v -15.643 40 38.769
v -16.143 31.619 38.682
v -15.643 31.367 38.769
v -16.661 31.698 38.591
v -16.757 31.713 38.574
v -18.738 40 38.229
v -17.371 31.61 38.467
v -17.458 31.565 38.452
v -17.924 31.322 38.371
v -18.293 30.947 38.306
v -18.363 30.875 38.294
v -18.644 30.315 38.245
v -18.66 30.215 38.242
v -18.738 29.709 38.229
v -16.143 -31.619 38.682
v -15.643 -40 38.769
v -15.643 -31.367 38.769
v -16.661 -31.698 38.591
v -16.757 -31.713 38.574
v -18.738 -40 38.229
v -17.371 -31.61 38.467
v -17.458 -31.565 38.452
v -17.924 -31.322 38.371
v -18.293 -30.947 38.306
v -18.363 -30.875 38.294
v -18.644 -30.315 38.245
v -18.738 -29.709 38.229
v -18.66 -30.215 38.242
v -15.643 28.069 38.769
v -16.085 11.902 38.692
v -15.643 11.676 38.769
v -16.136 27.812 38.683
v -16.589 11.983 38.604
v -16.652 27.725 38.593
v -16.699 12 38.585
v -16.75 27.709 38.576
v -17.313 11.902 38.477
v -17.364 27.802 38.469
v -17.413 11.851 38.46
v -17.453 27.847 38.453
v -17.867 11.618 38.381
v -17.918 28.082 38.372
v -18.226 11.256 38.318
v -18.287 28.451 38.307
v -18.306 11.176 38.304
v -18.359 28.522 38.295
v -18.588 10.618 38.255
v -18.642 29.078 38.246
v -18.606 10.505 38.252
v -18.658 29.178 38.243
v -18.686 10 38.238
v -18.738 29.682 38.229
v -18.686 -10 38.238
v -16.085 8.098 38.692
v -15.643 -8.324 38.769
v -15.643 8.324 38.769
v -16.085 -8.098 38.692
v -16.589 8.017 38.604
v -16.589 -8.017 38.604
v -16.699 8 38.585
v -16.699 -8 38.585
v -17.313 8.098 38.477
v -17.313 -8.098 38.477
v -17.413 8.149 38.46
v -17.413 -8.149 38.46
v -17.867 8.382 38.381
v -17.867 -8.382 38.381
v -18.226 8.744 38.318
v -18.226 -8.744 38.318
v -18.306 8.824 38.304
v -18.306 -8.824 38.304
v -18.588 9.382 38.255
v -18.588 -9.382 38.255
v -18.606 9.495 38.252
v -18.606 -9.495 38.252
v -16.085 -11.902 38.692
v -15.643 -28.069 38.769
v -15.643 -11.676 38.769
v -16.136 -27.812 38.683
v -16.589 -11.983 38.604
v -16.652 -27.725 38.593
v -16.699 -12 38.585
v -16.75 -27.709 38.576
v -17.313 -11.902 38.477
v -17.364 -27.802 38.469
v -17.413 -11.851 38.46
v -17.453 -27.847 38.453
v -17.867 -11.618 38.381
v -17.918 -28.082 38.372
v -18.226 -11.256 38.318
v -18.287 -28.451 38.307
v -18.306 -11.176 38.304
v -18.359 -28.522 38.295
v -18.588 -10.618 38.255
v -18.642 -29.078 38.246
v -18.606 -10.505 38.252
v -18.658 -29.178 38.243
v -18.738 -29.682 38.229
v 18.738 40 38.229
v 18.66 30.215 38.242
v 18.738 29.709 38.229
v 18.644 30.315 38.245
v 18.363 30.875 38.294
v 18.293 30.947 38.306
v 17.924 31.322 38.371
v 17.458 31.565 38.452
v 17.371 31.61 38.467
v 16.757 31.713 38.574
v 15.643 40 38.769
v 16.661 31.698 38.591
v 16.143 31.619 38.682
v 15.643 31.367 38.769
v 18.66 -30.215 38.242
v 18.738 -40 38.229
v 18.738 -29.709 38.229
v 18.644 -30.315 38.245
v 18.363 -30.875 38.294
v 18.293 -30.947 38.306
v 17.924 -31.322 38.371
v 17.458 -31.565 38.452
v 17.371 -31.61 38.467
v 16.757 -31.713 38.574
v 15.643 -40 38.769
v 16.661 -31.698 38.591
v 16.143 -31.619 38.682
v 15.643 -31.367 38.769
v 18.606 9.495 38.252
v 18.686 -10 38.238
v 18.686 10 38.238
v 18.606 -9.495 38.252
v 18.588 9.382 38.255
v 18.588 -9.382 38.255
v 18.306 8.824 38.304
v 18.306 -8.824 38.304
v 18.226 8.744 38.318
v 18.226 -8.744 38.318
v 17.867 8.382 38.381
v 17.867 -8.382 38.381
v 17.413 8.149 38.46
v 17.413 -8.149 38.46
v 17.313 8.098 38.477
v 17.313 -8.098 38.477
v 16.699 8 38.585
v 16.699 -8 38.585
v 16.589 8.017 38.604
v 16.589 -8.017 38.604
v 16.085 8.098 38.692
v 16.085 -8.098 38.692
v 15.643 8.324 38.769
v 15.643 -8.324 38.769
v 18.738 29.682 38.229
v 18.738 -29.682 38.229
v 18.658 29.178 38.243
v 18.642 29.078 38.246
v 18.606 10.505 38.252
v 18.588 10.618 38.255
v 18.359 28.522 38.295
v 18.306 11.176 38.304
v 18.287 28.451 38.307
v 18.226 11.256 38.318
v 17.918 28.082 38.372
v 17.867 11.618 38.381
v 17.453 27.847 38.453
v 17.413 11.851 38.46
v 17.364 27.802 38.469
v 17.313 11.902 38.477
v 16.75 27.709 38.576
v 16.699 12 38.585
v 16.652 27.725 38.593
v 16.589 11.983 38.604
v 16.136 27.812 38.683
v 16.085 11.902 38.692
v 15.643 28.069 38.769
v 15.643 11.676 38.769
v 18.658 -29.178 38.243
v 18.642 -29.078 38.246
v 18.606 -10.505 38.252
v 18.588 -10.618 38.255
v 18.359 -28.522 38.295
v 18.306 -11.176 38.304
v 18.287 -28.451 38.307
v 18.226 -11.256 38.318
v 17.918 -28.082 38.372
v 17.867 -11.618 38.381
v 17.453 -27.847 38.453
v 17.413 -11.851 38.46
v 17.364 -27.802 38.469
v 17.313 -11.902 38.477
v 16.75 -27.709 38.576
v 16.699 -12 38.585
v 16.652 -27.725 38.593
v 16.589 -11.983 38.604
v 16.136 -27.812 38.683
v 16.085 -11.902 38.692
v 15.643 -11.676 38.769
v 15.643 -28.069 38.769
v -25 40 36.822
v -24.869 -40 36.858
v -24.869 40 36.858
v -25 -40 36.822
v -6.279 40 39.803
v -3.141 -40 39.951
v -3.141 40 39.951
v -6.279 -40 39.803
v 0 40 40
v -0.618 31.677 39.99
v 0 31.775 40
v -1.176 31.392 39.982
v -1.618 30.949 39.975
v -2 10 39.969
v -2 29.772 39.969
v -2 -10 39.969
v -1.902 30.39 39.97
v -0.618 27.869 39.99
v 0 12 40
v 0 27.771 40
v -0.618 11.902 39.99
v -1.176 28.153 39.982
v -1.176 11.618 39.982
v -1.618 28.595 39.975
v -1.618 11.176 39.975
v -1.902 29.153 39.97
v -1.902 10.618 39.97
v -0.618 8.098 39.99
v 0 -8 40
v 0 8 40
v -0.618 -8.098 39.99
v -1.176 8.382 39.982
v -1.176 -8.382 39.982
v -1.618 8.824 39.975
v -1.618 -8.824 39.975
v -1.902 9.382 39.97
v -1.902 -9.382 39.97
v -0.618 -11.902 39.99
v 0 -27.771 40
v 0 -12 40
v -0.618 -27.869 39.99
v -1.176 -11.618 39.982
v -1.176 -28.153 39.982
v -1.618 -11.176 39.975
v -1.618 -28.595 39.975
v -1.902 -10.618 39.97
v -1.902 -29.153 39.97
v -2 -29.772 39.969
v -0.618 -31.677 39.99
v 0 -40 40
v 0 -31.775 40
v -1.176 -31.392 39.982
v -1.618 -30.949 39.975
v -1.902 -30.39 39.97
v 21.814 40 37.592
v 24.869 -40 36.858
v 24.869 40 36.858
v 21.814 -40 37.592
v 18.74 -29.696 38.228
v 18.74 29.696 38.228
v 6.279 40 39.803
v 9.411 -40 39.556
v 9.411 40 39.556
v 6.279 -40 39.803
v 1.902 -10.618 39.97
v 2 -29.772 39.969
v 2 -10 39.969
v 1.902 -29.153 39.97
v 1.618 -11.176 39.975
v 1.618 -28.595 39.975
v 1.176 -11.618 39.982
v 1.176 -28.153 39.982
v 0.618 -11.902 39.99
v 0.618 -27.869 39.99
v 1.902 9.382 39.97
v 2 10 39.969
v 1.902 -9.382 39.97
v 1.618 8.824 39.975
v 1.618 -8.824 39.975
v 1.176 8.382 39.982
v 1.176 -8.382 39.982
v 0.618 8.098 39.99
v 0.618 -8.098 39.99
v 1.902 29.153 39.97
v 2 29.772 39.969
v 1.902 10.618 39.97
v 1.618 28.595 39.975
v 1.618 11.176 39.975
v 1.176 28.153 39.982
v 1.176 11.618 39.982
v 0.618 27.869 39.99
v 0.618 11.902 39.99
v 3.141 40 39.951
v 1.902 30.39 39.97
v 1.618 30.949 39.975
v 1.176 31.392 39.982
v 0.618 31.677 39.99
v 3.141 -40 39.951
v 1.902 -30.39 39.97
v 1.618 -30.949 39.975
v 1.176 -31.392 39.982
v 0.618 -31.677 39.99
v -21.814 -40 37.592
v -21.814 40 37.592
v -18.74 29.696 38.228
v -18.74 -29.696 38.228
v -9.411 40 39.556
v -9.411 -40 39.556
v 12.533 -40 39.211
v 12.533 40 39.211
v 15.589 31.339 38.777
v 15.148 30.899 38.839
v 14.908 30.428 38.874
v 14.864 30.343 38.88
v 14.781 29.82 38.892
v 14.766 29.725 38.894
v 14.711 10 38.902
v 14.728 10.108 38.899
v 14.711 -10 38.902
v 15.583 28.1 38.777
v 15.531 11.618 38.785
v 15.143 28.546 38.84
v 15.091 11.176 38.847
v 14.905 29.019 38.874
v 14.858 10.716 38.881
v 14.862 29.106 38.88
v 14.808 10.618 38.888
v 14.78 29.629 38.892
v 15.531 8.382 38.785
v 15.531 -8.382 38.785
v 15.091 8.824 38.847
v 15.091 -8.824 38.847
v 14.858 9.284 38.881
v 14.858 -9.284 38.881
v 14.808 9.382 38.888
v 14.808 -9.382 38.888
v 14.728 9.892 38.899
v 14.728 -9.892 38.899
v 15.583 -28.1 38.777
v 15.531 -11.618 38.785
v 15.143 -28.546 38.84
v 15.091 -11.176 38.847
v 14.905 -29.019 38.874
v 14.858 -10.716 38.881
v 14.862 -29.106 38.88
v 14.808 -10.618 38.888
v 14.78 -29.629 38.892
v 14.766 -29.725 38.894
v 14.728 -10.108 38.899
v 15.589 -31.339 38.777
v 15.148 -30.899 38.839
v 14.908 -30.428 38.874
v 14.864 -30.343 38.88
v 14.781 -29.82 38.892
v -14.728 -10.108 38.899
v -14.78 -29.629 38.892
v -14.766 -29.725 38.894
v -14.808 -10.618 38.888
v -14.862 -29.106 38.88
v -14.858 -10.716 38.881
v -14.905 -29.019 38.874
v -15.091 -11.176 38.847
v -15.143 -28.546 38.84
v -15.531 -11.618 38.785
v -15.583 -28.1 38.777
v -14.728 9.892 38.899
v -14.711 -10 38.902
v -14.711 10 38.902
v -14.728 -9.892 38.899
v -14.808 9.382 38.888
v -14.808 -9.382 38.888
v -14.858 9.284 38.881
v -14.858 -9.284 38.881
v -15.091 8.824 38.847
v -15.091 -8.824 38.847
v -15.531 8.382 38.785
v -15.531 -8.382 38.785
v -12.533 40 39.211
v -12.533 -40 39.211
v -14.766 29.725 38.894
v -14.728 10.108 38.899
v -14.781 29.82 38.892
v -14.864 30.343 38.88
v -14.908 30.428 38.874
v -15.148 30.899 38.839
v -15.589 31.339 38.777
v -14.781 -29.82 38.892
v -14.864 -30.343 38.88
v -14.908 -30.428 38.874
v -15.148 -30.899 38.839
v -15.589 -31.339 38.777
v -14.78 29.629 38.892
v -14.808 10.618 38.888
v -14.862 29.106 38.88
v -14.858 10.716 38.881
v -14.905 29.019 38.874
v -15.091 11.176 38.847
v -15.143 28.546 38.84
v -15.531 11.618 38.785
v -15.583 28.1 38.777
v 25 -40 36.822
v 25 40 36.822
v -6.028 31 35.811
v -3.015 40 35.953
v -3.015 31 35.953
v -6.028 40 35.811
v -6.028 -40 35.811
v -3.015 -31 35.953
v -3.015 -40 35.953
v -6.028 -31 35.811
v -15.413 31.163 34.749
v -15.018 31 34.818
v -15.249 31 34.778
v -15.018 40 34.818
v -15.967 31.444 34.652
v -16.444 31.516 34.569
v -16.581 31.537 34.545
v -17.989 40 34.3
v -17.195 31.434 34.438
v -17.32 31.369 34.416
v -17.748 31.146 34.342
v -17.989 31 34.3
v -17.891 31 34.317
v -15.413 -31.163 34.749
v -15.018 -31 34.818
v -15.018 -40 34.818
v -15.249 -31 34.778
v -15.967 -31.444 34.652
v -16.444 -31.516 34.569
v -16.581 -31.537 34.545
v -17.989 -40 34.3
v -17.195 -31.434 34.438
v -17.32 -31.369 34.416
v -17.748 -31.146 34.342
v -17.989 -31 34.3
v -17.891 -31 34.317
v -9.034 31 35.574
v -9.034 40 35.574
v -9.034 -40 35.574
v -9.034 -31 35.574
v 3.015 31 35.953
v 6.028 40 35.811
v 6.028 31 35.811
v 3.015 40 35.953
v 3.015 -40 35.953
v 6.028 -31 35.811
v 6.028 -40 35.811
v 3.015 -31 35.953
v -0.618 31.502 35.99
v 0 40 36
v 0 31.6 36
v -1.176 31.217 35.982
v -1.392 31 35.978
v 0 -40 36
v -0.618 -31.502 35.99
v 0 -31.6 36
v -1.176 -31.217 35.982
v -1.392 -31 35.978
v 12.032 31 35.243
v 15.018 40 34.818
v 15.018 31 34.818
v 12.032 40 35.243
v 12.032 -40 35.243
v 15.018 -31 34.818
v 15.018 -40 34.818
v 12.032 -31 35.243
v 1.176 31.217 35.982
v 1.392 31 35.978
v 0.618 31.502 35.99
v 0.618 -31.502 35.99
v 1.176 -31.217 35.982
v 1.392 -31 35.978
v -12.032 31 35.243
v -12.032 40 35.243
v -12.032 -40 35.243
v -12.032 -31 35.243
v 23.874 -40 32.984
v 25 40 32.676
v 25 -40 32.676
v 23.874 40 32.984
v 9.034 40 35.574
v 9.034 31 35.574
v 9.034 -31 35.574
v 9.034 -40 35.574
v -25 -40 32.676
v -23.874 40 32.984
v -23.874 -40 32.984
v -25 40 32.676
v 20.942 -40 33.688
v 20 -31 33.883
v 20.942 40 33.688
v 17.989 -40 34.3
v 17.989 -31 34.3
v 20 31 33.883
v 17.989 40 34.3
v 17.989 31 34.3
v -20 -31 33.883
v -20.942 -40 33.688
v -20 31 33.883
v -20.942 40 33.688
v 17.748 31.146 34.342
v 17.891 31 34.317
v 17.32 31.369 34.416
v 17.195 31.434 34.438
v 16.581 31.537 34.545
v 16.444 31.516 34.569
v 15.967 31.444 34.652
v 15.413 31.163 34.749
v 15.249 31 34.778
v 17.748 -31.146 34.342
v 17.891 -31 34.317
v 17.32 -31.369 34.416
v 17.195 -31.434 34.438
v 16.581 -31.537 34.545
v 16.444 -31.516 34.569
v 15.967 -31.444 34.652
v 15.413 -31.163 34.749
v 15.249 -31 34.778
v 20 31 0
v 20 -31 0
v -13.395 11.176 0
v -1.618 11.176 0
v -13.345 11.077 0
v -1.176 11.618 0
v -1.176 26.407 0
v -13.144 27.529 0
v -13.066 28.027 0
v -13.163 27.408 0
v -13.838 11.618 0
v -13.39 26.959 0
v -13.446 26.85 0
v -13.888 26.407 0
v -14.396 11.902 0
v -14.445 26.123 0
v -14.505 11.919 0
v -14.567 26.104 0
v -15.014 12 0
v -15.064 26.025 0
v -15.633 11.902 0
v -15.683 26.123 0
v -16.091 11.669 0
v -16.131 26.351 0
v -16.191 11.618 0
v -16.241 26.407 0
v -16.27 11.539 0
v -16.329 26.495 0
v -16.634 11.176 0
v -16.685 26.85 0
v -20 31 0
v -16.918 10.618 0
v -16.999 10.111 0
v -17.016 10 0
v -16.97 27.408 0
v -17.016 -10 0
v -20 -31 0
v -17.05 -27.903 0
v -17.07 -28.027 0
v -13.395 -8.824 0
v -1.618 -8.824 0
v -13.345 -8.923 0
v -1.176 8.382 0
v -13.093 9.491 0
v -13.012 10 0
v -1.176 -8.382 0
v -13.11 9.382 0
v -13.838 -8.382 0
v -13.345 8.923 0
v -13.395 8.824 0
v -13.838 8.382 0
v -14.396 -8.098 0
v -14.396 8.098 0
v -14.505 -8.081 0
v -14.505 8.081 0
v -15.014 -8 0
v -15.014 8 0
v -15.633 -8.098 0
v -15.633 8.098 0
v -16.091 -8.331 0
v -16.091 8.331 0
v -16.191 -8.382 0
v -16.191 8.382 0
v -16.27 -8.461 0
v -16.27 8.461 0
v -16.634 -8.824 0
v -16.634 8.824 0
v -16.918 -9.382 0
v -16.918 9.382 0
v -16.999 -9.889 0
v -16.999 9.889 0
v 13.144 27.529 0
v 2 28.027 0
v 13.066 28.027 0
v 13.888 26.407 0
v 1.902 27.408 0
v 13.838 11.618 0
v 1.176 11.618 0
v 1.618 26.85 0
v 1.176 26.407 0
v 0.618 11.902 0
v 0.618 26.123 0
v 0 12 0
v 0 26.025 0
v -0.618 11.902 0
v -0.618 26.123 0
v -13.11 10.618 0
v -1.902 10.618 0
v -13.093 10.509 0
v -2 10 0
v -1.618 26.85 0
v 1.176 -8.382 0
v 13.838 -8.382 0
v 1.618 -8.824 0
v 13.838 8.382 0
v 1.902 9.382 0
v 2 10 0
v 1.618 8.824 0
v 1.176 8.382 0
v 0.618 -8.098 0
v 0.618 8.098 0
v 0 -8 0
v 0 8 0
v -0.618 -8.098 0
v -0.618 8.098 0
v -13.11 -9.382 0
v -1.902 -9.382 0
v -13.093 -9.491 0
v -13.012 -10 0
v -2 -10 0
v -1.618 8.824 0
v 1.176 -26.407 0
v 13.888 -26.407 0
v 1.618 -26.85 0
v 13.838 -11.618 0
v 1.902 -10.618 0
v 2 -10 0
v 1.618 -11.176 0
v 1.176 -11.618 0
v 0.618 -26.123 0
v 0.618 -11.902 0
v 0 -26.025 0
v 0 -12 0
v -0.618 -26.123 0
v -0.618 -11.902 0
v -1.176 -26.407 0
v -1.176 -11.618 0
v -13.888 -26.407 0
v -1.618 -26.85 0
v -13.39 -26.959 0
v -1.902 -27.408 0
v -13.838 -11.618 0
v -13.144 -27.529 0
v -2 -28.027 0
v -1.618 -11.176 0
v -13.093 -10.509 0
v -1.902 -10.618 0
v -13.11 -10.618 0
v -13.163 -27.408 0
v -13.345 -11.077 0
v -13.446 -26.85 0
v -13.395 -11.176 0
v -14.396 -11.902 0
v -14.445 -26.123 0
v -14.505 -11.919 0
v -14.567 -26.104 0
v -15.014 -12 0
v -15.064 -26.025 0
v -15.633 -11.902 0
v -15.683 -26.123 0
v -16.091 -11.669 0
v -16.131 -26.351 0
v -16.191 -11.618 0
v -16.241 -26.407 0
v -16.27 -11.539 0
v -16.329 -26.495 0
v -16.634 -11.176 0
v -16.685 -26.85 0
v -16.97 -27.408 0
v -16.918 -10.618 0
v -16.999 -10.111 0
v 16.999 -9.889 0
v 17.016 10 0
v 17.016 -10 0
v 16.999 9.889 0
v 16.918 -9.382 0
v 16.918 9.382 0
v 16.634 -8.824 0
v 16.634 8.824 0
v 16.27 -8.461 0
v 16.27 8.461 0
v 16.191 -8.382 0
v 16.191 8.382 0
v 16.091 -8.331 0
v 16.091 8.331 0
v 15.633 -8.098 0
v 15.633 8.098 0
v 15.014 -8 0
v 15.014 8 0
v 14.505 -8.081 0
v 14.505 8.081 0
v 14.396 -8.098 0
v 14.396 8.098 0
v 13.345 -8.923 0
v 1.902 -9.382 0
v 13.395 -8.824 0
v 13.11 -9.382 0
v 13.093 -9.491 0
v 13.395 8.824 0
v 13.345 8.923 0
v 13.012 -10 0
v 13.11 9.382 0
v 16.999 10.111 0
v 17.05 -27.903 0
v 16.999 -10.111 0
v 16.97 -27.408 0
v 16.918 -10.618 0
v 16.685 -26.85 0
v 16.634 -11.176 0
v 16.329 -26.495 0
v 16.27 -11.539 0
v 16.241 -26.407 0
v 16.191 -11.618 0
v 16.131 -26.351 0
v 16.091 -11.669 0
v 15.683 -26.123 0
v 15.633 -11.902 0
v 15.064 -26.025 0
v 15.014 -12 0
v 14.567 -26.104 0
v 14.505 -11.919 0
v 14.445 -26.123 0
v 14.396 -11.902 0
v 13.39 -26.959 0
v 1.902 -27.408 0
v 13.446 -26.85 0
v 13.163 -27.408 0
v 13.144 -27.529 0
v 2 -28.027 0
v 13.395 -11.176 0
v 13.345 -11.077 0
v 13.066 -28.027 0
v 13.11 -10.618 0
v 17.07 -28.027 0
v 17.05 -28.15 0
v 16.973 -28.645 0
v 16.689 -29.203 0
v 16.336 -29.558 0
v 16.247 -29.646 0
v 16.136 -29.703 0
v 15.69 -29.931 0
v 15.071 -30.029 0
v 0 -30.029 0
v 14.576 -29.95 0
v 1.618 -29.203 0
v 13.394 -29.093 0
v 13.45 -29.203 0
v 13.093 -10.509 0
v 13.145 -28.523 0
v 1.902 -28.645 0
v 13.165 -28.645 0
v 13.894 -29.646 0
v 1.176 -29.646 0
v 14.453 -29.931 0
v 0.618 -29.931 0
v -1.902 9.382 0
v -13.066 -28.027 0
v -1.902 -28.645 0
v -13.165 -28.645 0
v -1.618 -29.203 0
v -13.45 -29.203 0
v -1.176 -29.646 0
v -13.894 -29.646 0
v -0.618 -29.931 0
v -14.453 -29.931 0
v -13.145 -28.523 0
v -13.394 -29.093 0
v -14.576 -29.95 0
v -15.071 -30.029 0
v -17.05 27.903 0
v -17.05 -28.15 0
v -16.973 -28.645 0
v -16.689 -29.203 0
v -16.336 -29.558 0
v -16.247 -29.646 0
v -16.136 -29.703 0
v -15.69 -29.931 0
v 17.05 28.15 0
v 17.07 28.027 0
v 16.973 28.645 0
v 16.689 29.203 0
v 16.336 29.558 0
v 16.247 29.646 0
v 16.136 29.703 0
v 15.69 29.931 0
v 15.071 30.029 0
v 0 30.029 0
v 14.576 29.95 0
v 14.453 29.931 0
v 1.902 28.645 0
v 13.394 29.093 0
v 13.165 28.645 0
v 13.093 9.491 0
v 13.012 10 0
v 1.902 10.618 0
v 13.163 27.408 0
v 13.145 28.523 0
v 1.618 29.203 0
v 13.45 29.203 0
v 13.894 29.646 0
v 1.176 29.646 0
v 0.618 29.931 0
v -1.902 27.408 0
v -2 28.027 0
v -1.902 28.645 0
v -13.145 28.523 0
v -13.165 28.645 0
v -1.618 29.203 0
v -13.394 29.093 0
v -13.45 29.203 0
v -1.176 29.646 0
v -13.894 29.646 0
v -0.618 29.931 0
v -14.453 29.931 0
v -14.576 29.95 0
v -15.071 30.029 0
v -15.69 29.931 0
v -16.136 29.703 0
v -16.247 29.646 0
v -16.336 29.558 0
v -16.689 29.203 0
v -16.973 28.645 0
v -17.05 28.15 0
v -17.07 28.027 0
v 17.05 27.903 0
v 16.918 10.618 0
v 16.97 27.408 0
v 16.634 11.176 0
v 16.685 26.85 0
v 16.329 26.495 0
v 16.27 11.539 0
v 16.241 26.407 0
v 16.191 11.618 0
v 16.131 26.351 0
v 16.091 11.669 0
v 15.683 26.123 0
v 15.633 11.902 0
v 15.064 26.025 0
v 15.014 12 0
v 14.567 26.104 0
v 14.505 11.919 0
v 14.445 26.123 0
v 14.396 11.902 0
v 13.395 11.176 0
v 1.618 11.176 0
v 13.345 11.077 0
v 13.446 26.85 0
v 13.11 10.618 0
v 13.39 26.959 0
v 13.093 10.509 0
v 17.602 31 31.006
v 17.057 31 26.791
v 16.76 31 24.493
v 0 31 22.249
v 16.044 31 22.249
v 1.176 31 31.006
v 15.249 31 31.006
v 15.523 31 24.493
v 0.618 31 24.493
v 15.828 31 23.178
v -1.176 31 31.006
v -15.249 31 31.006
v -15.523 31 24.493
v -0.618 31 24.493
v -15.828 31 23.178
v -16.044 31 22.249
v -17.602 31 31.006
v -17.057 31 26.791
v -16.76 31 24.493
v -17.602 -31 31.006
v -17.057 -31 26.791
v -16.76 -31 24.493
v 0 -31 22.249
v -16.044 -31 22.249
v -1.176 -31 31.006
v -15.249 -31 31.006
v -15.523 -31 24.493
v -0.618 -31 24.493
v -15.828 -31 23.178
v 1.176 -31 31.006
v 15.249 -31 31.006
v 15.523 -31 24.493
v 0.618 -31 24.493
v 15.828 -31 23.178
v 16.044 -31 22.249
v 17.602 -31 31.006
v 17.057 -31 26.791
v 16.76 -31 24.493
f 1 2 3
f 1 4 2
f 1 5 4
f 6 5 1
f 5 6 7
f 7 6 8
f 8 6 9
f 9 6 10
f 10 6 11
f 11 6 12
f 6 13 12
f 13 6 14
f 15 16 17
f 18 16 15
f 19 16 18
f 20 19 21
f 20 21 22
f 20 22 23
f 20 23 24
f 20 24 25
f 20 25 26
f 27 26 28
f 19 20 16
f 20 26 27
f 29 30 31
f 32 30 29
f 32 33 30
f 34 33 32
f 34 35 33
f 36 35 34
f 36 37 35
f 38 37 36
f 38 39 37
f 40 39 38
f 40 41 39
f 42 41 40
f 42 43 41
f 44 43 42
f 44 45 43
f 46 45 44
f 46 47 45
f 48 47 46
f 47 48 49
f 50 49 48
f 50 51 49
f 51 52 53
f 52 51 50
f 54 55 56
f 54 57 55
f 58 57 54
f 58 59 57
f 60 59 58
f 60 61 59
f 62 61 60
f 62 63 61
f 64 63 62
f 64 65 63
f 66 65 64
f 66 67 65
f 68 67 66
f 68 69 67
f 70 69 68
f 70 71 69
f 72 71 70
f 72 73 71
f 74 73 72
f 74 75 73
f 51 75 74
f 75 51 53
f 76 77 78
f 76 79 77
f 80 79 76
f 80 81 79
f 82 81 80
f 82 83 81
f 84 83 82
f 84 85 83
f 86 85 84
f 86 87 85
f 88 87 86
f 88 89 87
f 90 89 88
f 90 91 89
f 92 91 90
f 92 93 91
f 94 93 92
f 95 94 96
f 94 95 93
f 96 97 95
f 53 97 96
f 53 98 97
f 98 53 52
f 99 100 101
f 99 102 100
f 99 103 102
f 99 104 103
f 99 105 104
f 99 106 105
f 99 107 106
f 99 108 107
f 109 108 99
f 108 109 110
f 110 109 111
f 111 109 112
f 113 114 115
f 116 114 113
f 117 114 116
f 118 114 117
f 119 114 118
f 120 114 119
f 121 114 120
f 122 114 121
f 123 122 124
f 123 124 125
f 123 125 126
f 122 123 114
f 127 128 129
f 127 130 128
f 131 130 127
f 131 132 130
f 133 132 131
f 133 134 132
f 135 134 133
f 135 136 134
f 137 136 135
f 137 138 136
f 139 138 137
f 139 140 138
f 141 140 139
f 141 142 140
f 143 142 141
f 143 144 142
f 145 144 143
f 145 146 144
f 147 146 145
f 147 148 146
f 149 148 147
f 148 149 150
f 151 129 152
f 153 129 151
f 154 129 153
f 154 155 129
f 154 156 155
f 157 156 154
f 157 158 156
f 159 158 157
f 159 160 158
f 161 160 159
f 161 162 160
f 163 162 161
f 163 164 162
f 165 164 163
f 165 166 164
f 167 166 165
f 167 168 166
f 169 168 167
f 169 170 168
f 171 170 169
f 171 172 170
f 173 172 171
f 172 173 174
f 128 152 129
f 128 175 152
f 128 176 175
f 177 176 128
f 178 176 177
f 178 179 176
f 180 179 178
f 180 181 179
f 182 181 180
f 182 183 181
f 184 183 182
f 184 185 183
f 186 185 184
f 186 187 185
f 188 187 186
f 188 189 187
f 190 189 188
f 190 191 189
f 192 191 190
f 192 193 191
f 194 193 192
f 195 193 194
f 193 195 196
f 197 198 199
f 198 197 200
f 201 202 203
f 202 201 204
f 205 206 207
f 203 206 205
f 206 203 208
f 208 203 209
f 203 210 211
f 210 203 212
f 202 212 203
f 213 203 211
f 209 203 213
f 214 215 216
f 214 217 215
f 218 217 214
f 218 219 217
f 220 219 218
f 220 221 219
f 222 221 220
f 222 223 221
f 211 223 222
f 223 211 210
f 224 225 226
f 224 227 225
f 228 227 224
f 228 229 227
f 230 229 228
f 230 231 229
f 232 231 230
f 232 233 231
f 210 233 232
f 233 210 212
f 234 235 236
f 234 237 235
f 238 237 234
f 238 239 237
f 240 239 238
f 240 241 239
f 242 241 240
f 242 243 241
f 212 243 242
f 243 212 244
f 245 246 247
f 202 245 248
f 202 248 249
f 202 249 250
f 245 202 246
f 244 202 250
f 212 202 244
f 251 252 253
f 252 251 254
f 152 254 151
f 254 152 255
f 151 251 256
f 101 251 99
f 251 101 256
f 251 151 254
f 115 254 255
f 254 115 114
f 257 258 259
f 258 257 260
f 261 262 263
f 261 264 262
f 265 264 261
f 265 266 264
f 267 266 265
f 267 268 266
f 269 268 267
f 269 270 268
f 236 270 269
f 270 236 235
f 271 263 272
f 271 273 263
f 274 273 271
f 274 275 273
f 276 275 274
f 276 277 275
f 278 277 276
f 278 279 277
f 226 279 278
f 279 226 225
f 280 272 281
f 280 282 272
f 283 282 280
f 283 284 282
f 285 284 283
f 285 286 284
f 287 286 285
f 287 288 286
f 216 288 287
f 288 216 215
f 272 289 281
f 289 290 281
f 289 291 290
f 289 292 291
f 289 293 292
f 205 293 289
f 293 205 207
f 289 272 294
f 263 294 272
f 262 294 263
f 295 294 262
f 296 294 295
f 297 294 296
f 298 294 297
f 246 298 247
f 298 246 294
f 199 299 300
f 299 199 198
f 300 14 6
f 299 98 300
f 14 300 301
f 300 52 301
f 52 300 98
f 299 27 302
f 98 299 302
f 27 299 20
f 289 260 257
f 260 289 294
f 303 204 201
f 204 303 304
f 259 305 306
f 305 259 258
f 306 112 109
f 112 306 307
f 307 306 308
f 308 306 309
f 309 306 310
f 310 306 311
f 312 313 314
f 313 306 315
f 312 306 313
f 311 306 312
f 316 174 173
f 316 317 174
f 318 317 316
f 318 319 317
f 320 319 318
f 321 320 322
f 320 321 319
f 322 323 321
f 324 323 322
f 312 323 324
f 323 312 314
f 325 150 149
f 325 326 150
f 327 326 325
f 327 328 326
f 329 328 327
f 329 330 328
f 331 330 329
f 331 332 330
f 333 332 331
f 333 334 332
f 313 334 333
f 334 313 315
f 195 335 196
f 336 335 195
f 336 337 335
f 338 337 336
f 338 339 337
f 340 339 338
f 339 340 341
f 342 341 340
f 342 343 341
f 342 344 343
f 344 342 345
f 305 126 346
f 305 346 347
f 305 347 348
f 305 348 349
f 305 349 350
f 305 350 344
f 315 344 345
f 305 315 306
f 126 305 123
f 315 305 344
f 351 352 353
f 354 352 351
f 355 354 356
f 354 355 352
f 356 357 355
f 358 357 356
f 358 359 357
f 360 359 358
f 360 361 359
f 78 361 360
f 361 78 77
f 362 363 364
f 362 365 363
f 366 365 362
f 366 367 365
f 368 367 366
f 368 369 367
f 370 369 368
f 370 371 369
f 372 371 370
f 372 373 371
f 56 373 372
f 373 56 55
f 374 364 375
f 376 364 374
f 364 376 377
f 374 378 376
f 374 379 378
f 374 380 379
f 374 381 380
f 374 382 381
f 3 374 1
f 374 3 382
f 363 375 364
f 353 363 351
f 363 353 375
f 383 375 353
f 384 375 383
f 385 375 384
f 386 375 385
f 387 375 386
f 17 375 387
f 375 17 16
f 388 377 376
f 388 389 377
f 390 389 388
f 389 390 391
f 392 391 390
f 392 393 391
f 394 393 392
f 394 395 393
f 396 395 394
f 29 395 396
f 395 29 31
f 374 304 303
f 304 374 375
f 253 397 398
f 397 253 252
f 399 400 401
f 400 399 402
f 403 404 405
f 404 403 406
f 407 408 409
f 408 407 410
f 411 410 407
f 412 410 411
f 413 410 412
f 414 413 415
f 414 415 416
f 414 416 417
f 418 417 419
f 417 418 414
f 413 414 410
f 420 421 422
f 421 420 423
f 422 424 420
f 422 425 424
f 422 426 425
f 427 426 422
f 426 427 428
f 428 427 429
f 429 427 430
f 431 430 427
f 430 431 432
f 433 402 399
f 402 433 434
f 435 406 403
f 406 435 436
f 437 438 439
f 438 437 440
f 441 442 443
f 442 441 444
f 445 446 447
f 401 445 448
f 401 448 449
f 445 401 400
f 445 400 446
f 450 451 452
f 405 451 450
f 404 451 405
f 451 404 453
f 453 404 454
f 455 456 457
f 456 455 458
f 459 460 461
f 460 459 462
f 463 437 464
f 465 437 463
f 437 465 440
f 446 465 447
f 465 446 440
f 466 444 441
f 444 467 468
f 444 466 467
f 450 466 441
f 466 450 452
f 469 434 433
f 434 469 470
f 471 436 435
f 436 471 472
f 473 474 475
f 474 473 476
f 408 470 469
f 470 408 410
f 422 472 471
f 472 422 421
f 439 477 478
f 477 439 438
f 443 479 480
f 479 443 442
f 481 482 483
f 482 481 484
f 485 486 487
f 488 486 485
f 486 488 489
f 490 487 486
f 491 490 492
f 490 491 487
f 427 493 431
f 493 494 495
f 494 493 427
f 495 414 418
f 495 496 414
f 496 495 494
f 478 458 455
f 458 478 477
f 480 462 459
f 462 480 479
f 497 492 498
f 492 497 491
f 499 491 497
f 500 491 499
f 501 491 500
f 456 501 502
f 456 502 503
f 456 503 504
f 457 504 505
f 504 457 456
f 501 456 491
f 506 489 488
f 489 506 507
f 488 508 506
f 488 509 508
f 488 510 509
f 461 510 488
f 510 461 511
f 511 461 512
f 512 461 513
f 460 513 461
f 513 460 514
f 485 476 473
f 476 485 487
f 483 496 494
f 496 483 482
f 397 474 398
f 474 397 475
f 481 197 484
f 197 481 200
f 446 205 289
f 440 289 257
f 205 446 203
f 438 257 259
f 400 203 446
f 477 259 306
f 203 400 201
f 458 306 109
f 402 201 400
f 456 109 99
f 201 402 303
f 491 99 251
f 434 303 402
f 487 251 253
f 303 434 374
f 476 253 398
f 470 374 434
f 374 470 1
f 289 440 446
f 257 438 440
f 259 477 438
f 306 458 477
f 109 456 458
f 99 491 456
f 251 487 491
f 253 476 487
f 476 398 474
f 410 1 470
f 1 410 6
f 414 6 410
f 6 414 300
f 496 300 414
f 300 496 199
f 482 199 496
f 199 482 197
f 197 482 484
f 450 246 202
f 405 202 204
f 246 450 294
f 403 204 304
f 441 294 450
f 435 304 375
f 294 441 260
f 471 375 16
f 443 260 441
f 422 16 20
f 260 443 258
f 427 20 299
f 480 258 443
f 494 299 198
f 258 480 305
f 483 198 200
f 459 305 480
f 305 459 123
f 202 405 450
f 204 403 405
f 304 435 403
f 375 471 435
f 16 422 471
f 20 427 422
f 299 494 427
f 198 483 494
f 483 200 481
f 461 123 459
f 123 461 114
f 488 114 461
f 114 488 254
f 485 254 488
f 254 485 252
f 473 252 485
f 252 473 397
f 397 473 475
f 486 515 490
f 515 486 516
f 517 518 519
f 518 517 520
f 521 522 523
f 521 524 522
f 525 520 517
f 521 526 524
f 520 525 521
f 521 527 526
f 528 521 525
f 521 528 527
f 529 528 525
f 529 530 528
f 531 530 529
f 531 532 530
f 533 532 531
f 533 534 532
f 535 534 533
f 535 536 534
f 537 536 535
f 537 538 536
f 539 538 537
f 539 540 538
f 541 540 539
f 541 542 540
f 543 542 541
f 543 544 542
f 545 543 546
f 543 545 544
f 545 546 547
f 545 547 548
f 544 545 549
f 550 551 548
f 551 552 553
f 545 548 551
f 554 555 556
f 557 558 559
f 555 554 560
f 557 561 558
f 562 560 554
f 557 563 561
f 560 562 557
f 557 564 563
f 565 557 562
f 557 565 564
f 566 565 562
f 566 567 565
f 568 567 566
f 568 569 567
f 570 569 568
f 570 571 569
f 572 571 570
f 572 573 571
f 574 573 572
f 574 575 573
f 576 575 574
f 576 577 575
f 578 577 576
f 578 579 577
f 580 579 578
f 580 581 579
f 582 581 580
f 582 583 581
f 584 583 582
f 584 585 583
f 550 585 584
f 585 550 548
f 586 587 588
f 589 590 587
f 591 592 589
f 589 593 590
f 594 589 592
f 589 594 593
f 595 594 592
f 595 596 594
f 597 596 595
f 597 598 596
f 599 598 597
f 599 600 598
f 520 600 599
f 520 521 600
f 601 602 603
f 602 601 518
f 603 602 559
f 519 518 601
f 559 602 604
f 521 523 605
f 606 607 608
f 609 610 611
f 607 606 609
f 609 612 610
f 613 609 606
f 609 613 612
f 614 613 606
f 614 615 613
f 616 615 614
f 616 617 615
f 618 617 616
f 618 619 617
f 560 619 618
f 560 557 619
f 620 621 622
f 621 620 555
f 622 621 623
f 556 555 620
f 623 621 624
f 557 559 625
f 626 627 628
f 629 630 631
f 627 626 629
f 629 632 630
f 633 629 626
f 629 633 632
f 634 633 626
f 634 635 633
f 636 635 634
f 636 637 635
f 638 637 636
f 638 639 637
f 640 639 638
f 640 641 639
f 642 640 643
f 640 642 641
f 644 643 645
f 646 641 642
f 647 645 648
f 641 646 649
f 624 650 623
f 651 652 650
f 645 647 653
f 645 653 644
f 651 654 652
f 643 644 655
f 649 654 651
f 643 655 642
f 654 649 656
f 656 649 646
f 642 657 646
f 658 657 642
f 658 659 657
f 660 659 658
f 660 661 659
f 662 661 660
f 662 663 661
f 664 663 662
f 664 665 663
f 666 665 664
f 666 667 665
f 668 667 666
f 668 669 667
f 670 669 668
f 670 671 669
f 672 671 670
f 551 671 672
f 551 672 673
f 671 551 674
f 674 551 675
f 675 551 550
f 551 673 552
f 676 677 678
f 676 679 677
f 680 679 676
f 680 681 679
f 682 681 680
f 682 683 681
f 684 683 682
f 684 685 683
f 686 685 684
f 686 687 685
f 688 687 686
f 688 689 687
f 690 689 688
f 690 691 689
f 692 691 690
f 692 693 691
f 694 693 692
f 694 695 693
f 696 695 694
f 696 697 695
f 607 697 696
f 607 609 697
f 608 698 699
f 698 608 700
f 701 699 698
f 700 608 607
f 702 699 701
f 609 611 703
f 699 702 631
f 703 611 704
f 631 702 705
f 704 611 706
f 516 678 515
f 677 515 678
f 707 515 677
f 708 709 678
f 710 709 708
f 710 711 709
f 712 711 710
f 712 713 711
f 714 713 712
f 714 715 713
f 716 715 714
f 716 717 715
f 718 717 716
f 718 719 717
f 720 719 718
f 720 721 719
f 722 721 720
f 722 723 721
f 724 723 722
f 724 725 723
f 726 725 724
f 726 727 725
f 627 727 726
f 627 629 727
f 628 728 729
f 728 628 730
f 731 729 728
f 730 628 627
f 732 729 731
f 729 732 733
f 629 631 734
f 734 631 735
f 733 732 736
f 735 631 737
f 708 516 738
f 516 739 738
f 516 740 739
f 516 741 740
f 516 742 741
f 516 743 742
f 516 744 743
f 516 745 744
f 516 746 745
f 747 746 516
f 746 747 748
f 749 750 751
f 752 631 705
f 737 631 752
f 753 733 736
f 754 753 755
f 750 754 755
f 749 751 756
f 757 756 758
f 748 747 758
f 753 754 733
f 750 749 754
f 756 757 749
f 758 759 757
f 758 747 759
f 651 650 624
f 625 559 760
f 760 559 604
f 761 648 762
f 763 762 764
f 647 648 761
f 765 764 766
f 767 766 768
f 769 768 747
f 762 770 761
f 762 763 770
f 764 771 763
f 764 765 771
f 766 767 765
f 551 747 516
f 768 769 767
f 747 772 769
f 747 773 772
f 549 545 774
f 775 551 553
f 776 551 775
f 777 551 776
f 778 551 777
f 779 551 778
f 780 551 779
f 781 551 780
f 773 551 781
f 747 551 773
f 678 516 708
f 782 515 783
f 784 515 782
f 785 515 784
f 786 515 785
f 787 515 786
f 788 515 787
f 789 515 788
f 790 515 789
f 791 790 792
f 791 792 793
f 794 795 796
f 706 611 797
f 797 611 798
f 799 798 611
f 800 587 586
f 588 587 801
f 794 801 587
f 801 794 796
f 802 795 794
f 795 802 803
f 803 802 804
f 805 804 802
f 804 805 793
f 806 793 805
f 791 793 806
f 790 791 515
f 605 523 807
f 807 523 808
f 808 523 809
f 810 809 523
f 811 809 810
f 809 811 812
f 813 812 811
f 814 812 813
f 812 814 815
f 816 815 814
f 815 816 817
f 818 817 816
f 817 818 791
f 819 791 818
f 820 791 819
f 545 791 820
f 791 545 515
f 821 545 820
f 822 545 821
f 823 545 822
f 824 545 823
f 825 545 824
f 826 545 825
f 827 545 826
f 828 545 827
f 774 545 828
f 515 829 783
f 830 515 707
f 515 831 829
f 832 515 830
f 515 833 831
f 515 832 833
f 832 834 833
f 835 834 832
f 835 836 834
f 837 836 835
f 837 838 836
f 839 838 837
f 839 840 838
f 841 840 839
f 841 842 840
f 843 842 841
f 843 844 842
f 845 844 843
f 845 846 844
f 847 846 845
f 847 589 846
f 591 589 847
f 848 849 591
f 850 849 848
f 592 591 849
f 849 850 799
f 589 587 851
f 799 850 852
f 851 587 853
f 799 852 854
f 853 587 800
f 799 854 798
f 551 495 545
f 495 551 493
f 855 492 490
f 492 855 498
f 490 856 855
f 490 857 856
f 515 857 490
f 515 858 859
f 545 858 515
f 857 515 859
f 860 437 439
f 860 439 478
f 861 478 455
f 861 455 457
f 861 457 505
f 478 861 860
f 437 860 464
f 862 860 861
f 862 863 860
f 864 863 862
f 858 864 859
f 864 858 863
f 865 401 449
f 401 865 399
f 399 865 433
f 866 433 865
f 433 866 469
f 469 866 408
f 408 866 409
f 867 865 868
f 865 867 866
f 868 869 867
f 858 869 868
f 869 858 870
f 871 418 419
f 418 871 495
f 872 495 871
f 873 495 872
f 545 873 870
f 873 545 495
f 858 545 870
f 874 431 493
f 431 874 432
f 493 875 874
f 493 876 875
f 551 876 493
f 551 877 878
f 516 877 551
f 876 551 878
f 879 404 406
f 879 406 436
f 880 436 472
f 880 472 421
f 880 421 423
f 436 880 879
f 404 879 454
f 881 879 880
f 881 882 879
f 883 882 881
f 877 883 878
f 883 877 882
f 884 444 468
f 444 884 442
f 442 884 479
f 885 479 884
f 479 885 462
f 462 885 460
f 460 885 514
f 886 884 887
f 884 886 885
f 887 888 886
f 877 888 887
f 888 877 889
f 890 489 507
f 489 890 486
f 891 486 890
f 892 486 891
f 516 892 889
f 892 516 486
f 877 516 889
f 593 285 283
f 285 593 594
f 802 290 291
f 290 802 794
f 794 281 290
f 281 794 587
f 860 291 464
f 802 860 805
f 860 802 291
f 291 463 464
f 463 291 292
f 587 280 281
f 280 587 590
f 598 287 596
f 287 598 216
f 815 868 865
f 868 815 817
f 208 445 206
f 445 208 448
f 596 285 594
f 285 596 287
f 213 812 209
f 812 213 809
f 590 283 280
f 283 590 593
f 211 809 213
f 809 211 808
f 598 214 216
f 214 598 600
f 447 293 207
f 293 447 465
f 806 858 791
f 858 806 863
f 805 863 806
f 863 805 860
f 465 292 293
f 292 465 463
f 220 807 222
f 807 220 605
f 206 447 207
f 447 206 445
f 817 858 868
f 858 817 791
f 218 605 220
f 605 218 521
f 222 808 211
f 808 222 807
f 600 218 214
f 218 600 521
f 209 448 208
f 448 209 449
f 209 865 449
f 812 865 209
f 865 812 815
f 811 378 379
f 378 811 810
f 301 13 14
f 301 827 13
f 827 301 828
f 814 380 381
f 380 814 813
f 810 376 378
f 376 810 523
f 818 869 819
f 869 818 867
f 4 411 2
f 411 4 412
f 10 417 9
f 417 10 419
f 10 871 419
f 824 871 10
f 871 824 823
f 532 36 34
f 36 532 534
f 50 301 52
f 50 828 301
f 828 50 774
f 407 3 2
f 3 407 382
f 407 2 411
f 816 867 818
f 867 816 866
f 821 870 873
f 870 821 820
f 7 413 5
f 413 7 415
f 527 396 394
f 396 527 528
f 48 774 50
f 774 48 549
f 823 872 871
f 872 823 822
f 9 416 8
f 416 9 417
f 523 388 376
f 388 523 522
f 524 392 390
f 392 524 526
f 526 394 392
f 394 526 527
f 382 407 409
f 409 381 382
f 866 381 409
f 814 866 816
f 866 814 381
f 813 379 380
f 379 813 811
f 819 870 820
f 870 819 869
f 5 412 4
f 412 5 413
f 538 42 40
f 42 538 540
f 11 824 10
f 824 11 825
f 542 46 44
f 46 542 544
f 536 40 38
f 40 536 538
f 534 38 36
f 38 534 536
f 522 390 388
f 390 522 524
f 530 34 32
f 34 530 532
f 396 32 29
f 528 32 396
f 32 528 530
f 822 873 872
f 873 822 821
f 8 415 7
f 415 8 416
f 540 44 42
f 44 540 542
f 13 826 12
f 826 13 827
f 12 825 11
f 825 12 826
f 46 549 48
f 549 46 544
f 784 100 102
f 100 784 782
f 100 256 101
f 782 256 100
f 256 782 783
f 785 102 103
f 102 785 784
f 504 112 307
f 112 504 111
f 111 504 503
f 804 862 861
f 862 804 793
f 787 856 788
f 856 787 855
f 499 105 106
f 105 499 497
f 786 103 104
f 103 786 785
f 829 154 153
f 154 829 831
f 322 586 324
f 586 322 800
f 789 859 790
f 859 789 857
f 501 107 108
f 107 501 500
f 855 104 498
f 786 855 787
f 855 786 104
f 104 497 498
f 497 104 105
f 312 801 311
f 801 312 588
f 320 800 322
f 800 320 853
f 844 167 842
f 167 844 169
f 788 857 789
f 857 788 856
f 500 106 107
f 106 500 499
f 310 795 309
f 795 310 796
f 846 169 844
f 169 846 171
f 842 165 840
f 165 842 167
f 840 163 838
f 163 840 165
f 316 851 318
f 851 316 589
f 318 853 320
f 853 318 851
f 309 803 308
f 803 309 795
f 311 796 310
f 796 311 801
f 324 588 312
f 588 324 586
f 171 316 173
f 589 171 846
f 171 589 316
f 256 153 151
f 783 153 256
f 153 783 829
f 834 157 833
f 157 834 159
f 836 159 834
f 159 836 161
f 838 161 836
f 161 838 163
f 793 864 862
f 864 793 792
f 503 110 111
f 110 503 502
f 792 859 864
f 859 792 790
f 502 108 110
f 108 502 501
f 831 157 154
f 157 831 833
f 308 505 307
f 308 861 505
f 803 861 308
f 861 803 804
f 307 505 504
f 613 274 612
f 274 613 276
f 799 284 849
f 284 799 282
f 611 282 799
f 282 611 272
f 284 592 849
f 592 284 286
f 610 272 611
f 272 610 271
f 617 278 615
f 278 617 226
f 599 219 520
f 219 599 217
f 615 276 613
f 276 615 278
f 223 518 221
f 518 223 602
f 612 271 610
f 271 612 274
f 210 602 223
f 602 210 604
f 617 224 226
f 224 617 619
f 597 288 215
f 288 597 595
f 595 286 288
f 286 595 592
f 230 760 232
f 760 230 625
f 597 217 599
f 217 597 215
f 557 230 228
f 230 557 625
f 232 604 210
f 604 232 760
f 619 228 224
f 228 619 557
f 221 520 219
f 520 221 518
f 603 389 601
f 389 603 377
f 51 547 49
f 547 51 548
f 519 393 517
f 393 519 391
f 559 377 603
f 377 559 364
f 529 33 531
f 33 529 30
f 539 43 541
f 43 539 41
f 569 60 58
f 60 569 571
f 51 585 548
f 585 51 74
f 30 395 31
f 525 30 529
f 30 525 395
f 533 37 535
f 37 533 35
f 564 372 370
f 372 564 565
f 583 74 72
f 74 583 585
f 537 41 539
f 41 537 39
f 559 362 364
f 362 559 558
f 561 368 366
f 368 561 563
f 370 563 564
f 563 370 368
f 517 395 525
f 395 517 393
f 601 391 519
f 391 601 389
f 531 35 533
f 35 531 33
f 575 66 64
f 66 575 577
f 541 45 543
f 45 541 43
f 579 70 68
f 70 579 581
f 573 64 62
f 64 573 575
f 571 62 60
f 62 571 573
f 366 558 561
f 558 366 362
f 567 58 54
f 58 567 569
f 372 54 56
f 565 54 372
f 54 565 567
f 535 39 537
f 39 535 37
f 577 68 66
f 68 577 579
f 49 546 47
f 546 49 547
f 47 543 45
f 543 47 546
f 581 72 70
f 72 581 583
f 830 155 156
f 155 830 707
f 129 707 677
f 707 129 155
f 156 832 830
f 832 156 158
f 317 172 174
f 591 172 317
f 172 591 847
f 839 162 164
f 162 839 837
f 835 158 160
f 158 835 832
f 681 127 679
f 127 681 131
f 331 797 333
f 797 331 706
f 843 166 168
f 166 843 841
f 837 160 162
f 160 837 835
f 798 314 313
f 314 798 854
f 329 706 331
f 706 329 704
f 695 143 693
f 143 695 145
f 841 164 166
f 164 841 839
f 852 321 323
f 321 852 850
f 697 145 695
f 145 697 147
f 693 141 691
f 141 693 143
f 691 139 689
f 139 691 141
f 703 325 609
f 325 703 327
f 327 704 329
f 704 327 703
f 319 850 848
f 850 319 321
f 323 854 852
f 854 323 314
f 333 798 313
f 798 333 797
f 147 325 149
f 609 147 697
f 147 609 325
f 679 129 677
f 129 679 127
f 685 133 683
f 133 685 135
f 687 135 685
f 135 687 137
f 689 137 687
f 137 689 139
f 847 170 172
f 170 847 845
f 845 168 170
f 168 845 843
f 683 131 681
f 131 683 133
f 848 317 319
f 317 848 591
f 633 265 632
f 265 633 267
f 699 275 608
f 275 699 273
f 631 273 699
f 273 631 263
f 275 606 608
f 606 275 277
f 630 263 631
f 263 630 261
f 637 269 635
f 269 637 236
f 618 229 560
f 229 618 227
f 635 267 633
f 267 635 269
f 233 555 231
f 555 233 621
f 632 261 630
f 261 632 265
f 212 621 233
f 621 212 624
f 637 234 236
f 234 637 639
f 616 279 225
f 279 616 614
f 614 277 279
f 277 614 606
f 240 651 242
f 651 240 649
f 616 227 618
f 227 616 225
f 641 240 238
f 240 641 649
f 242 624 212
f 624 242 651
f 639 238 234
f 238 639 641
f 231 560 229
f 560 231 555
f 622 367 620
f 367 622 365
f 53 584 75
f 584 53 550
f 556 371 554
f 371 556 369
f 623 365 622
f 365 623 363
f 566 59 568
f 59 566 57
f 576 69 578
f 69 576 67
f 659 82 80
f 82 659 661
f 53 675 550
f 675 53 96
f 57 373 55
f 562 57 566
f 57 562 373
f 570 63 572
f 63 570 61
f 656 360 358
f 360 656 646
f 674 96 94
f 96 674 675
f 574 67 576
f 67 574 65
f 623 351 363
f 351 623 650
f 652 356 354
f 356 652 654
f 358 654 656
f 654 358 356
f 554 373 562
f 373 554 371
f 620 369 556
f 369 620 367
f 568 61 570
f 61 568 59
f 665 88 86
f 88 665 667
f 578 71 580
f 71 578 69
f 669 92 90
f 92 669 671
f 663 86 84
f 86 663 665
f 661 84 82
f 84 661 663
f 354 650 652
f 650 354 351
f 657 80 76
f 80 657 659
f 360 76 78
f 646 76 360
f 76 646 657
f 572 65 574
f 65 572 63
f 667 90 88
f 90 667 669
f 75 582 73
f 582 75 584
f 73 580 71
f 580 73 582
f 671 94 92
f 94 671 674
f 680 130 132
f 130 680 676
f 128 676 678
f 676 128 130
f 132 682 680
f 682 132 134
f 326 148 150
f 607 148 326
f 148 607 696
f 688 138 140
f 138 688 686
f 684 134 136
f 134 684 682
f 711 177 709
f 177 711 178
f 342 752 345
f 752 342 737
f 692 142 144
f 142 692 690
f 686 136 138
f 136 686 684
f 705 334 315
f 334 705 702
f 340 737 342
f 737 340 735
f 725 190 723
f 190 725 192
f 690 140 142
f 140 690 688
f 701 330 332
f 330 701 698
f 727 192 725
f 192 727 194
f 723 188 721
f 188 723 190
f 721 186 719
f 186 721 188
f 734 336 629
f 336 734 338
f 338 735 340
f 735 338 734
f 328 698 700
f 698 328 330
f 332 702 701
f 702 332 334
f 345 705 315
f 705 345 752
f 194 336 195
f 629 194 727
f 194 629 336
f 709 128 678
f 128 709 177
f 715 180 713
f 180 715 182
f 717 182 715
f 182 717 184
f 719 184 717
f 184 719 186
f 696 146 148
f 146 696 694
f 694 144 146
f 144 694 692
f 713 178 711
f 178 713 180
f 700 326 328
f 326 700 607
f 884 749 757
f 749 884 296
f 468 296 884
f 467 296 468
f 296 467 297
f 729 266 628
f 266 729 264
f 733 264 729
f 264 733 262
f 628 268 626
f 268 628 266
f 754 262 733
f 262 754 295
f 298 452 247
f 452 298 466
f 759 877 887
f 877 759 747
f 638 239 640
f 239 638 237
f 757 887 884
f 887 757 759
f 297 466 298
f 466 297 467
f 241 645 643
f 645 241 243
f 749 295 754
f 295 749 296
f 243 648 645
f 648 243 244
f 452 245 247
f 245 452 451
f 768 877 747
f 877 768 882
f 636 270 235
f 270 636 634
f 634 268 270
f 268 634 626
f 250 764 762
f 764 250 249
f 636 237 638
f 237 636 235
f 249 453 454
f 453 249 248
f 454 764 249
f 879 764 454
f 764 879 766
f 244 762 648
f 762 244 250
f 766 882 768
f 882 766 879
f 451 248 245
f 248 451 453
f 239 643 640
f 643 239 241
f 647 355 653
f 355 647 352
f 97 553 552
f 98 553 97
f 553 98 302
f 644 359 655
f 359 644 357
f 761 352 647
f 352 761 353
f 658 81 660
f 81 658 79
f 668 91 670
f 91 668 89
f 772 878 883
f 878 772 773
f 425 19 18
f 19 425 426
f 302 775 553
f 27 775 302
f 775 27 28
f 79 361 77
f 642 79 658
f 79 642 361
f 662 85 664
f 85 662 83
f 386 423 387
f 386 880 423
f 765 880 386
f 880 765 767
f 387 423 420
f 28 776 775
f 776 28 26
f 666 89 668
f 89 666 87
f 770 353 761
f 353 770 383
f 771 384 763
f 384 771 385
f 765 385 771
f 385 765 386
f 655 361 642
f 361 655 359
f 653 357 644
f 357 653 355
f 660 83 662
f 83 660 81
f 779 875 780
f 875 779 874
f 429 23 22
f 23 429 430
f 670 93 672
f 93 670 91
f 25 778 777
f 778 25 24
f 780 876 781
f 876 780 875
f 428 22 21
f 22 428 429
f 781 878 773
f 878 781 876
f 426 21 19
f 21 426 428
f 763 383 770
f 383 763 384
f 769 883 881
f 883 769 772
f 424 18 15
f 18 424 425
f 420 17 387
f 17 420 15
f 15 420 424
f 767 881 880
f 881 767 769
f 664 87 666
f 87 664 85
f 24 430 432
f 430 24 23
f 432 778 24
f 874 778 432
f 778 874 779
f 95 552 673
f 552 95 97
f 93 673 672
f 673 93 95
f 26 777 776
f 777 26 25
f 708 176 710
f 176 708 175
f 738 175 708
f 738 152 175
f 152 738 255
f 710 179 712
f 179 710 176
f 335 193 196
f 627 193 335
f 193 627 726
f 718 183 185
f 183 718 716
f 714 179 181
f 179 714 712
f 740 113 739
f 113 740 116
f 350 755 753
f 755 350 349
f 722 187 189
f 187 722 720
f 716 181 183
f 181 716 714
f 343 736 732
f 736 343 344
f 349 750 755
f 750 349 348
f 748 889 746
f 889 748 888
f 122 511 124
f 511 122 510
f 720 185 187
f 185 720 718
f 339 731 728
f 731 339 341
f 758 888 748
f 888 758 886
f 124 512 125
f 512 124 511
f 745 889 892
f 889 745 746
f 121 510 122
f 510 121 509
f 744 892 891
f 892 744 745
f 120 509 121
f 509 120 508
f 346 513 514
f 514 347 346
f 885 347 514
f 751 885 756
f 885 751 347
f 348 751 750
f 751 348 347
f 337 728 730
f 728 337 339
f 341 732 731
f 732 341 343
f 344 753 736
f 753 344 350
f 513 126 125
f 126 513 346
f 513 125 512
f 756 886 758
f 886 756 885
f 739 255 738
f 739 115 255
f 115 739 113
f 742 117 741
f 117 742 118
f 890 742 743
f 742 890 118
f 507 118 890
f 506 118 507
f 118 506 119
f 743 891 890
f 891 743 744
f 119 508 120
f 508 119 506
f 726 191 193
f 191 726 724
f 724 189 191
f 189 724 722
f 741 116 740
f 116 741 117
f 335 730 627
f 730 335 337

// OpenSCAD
difference() {
    union() {
        translate([-20, -31, 0]) cube([40, 62, 37]);

        translate([0,0,-60]) intersection() {
        translate([0, 0, 100]) cube([50, 80, 100], center=true);
            rotate([90, 0, 0]) translate([0, 0, -200]) difference() {
                cylinder(h=500, r=100, $fn=200);
                translate([0, 0, -10]) cylinder(h=600, r=96, $fn=200);
            }
        }
    }
    rotate([-2.5, 0, 0])translate([0, 28, 0])slot();
    translate([0, 10, 0])slot();
    translate([0, -10, 0])slot();
    rotate([2.5, 0, 0]) translate([0, -28, 0])slot();
}

module slot() {
    translate([0, 0, -10]) cylinder(h=60, r=2, $fn=20);
    rotate([0, -2.5, 0]) translate([-15, 0, -10]) cylinder(h=60, r=2, $fn=20);
rotate([0, 2.5, 0]) translate([15, 0, -10]) cylinder(h=60, r=2, $fn=20);
}
